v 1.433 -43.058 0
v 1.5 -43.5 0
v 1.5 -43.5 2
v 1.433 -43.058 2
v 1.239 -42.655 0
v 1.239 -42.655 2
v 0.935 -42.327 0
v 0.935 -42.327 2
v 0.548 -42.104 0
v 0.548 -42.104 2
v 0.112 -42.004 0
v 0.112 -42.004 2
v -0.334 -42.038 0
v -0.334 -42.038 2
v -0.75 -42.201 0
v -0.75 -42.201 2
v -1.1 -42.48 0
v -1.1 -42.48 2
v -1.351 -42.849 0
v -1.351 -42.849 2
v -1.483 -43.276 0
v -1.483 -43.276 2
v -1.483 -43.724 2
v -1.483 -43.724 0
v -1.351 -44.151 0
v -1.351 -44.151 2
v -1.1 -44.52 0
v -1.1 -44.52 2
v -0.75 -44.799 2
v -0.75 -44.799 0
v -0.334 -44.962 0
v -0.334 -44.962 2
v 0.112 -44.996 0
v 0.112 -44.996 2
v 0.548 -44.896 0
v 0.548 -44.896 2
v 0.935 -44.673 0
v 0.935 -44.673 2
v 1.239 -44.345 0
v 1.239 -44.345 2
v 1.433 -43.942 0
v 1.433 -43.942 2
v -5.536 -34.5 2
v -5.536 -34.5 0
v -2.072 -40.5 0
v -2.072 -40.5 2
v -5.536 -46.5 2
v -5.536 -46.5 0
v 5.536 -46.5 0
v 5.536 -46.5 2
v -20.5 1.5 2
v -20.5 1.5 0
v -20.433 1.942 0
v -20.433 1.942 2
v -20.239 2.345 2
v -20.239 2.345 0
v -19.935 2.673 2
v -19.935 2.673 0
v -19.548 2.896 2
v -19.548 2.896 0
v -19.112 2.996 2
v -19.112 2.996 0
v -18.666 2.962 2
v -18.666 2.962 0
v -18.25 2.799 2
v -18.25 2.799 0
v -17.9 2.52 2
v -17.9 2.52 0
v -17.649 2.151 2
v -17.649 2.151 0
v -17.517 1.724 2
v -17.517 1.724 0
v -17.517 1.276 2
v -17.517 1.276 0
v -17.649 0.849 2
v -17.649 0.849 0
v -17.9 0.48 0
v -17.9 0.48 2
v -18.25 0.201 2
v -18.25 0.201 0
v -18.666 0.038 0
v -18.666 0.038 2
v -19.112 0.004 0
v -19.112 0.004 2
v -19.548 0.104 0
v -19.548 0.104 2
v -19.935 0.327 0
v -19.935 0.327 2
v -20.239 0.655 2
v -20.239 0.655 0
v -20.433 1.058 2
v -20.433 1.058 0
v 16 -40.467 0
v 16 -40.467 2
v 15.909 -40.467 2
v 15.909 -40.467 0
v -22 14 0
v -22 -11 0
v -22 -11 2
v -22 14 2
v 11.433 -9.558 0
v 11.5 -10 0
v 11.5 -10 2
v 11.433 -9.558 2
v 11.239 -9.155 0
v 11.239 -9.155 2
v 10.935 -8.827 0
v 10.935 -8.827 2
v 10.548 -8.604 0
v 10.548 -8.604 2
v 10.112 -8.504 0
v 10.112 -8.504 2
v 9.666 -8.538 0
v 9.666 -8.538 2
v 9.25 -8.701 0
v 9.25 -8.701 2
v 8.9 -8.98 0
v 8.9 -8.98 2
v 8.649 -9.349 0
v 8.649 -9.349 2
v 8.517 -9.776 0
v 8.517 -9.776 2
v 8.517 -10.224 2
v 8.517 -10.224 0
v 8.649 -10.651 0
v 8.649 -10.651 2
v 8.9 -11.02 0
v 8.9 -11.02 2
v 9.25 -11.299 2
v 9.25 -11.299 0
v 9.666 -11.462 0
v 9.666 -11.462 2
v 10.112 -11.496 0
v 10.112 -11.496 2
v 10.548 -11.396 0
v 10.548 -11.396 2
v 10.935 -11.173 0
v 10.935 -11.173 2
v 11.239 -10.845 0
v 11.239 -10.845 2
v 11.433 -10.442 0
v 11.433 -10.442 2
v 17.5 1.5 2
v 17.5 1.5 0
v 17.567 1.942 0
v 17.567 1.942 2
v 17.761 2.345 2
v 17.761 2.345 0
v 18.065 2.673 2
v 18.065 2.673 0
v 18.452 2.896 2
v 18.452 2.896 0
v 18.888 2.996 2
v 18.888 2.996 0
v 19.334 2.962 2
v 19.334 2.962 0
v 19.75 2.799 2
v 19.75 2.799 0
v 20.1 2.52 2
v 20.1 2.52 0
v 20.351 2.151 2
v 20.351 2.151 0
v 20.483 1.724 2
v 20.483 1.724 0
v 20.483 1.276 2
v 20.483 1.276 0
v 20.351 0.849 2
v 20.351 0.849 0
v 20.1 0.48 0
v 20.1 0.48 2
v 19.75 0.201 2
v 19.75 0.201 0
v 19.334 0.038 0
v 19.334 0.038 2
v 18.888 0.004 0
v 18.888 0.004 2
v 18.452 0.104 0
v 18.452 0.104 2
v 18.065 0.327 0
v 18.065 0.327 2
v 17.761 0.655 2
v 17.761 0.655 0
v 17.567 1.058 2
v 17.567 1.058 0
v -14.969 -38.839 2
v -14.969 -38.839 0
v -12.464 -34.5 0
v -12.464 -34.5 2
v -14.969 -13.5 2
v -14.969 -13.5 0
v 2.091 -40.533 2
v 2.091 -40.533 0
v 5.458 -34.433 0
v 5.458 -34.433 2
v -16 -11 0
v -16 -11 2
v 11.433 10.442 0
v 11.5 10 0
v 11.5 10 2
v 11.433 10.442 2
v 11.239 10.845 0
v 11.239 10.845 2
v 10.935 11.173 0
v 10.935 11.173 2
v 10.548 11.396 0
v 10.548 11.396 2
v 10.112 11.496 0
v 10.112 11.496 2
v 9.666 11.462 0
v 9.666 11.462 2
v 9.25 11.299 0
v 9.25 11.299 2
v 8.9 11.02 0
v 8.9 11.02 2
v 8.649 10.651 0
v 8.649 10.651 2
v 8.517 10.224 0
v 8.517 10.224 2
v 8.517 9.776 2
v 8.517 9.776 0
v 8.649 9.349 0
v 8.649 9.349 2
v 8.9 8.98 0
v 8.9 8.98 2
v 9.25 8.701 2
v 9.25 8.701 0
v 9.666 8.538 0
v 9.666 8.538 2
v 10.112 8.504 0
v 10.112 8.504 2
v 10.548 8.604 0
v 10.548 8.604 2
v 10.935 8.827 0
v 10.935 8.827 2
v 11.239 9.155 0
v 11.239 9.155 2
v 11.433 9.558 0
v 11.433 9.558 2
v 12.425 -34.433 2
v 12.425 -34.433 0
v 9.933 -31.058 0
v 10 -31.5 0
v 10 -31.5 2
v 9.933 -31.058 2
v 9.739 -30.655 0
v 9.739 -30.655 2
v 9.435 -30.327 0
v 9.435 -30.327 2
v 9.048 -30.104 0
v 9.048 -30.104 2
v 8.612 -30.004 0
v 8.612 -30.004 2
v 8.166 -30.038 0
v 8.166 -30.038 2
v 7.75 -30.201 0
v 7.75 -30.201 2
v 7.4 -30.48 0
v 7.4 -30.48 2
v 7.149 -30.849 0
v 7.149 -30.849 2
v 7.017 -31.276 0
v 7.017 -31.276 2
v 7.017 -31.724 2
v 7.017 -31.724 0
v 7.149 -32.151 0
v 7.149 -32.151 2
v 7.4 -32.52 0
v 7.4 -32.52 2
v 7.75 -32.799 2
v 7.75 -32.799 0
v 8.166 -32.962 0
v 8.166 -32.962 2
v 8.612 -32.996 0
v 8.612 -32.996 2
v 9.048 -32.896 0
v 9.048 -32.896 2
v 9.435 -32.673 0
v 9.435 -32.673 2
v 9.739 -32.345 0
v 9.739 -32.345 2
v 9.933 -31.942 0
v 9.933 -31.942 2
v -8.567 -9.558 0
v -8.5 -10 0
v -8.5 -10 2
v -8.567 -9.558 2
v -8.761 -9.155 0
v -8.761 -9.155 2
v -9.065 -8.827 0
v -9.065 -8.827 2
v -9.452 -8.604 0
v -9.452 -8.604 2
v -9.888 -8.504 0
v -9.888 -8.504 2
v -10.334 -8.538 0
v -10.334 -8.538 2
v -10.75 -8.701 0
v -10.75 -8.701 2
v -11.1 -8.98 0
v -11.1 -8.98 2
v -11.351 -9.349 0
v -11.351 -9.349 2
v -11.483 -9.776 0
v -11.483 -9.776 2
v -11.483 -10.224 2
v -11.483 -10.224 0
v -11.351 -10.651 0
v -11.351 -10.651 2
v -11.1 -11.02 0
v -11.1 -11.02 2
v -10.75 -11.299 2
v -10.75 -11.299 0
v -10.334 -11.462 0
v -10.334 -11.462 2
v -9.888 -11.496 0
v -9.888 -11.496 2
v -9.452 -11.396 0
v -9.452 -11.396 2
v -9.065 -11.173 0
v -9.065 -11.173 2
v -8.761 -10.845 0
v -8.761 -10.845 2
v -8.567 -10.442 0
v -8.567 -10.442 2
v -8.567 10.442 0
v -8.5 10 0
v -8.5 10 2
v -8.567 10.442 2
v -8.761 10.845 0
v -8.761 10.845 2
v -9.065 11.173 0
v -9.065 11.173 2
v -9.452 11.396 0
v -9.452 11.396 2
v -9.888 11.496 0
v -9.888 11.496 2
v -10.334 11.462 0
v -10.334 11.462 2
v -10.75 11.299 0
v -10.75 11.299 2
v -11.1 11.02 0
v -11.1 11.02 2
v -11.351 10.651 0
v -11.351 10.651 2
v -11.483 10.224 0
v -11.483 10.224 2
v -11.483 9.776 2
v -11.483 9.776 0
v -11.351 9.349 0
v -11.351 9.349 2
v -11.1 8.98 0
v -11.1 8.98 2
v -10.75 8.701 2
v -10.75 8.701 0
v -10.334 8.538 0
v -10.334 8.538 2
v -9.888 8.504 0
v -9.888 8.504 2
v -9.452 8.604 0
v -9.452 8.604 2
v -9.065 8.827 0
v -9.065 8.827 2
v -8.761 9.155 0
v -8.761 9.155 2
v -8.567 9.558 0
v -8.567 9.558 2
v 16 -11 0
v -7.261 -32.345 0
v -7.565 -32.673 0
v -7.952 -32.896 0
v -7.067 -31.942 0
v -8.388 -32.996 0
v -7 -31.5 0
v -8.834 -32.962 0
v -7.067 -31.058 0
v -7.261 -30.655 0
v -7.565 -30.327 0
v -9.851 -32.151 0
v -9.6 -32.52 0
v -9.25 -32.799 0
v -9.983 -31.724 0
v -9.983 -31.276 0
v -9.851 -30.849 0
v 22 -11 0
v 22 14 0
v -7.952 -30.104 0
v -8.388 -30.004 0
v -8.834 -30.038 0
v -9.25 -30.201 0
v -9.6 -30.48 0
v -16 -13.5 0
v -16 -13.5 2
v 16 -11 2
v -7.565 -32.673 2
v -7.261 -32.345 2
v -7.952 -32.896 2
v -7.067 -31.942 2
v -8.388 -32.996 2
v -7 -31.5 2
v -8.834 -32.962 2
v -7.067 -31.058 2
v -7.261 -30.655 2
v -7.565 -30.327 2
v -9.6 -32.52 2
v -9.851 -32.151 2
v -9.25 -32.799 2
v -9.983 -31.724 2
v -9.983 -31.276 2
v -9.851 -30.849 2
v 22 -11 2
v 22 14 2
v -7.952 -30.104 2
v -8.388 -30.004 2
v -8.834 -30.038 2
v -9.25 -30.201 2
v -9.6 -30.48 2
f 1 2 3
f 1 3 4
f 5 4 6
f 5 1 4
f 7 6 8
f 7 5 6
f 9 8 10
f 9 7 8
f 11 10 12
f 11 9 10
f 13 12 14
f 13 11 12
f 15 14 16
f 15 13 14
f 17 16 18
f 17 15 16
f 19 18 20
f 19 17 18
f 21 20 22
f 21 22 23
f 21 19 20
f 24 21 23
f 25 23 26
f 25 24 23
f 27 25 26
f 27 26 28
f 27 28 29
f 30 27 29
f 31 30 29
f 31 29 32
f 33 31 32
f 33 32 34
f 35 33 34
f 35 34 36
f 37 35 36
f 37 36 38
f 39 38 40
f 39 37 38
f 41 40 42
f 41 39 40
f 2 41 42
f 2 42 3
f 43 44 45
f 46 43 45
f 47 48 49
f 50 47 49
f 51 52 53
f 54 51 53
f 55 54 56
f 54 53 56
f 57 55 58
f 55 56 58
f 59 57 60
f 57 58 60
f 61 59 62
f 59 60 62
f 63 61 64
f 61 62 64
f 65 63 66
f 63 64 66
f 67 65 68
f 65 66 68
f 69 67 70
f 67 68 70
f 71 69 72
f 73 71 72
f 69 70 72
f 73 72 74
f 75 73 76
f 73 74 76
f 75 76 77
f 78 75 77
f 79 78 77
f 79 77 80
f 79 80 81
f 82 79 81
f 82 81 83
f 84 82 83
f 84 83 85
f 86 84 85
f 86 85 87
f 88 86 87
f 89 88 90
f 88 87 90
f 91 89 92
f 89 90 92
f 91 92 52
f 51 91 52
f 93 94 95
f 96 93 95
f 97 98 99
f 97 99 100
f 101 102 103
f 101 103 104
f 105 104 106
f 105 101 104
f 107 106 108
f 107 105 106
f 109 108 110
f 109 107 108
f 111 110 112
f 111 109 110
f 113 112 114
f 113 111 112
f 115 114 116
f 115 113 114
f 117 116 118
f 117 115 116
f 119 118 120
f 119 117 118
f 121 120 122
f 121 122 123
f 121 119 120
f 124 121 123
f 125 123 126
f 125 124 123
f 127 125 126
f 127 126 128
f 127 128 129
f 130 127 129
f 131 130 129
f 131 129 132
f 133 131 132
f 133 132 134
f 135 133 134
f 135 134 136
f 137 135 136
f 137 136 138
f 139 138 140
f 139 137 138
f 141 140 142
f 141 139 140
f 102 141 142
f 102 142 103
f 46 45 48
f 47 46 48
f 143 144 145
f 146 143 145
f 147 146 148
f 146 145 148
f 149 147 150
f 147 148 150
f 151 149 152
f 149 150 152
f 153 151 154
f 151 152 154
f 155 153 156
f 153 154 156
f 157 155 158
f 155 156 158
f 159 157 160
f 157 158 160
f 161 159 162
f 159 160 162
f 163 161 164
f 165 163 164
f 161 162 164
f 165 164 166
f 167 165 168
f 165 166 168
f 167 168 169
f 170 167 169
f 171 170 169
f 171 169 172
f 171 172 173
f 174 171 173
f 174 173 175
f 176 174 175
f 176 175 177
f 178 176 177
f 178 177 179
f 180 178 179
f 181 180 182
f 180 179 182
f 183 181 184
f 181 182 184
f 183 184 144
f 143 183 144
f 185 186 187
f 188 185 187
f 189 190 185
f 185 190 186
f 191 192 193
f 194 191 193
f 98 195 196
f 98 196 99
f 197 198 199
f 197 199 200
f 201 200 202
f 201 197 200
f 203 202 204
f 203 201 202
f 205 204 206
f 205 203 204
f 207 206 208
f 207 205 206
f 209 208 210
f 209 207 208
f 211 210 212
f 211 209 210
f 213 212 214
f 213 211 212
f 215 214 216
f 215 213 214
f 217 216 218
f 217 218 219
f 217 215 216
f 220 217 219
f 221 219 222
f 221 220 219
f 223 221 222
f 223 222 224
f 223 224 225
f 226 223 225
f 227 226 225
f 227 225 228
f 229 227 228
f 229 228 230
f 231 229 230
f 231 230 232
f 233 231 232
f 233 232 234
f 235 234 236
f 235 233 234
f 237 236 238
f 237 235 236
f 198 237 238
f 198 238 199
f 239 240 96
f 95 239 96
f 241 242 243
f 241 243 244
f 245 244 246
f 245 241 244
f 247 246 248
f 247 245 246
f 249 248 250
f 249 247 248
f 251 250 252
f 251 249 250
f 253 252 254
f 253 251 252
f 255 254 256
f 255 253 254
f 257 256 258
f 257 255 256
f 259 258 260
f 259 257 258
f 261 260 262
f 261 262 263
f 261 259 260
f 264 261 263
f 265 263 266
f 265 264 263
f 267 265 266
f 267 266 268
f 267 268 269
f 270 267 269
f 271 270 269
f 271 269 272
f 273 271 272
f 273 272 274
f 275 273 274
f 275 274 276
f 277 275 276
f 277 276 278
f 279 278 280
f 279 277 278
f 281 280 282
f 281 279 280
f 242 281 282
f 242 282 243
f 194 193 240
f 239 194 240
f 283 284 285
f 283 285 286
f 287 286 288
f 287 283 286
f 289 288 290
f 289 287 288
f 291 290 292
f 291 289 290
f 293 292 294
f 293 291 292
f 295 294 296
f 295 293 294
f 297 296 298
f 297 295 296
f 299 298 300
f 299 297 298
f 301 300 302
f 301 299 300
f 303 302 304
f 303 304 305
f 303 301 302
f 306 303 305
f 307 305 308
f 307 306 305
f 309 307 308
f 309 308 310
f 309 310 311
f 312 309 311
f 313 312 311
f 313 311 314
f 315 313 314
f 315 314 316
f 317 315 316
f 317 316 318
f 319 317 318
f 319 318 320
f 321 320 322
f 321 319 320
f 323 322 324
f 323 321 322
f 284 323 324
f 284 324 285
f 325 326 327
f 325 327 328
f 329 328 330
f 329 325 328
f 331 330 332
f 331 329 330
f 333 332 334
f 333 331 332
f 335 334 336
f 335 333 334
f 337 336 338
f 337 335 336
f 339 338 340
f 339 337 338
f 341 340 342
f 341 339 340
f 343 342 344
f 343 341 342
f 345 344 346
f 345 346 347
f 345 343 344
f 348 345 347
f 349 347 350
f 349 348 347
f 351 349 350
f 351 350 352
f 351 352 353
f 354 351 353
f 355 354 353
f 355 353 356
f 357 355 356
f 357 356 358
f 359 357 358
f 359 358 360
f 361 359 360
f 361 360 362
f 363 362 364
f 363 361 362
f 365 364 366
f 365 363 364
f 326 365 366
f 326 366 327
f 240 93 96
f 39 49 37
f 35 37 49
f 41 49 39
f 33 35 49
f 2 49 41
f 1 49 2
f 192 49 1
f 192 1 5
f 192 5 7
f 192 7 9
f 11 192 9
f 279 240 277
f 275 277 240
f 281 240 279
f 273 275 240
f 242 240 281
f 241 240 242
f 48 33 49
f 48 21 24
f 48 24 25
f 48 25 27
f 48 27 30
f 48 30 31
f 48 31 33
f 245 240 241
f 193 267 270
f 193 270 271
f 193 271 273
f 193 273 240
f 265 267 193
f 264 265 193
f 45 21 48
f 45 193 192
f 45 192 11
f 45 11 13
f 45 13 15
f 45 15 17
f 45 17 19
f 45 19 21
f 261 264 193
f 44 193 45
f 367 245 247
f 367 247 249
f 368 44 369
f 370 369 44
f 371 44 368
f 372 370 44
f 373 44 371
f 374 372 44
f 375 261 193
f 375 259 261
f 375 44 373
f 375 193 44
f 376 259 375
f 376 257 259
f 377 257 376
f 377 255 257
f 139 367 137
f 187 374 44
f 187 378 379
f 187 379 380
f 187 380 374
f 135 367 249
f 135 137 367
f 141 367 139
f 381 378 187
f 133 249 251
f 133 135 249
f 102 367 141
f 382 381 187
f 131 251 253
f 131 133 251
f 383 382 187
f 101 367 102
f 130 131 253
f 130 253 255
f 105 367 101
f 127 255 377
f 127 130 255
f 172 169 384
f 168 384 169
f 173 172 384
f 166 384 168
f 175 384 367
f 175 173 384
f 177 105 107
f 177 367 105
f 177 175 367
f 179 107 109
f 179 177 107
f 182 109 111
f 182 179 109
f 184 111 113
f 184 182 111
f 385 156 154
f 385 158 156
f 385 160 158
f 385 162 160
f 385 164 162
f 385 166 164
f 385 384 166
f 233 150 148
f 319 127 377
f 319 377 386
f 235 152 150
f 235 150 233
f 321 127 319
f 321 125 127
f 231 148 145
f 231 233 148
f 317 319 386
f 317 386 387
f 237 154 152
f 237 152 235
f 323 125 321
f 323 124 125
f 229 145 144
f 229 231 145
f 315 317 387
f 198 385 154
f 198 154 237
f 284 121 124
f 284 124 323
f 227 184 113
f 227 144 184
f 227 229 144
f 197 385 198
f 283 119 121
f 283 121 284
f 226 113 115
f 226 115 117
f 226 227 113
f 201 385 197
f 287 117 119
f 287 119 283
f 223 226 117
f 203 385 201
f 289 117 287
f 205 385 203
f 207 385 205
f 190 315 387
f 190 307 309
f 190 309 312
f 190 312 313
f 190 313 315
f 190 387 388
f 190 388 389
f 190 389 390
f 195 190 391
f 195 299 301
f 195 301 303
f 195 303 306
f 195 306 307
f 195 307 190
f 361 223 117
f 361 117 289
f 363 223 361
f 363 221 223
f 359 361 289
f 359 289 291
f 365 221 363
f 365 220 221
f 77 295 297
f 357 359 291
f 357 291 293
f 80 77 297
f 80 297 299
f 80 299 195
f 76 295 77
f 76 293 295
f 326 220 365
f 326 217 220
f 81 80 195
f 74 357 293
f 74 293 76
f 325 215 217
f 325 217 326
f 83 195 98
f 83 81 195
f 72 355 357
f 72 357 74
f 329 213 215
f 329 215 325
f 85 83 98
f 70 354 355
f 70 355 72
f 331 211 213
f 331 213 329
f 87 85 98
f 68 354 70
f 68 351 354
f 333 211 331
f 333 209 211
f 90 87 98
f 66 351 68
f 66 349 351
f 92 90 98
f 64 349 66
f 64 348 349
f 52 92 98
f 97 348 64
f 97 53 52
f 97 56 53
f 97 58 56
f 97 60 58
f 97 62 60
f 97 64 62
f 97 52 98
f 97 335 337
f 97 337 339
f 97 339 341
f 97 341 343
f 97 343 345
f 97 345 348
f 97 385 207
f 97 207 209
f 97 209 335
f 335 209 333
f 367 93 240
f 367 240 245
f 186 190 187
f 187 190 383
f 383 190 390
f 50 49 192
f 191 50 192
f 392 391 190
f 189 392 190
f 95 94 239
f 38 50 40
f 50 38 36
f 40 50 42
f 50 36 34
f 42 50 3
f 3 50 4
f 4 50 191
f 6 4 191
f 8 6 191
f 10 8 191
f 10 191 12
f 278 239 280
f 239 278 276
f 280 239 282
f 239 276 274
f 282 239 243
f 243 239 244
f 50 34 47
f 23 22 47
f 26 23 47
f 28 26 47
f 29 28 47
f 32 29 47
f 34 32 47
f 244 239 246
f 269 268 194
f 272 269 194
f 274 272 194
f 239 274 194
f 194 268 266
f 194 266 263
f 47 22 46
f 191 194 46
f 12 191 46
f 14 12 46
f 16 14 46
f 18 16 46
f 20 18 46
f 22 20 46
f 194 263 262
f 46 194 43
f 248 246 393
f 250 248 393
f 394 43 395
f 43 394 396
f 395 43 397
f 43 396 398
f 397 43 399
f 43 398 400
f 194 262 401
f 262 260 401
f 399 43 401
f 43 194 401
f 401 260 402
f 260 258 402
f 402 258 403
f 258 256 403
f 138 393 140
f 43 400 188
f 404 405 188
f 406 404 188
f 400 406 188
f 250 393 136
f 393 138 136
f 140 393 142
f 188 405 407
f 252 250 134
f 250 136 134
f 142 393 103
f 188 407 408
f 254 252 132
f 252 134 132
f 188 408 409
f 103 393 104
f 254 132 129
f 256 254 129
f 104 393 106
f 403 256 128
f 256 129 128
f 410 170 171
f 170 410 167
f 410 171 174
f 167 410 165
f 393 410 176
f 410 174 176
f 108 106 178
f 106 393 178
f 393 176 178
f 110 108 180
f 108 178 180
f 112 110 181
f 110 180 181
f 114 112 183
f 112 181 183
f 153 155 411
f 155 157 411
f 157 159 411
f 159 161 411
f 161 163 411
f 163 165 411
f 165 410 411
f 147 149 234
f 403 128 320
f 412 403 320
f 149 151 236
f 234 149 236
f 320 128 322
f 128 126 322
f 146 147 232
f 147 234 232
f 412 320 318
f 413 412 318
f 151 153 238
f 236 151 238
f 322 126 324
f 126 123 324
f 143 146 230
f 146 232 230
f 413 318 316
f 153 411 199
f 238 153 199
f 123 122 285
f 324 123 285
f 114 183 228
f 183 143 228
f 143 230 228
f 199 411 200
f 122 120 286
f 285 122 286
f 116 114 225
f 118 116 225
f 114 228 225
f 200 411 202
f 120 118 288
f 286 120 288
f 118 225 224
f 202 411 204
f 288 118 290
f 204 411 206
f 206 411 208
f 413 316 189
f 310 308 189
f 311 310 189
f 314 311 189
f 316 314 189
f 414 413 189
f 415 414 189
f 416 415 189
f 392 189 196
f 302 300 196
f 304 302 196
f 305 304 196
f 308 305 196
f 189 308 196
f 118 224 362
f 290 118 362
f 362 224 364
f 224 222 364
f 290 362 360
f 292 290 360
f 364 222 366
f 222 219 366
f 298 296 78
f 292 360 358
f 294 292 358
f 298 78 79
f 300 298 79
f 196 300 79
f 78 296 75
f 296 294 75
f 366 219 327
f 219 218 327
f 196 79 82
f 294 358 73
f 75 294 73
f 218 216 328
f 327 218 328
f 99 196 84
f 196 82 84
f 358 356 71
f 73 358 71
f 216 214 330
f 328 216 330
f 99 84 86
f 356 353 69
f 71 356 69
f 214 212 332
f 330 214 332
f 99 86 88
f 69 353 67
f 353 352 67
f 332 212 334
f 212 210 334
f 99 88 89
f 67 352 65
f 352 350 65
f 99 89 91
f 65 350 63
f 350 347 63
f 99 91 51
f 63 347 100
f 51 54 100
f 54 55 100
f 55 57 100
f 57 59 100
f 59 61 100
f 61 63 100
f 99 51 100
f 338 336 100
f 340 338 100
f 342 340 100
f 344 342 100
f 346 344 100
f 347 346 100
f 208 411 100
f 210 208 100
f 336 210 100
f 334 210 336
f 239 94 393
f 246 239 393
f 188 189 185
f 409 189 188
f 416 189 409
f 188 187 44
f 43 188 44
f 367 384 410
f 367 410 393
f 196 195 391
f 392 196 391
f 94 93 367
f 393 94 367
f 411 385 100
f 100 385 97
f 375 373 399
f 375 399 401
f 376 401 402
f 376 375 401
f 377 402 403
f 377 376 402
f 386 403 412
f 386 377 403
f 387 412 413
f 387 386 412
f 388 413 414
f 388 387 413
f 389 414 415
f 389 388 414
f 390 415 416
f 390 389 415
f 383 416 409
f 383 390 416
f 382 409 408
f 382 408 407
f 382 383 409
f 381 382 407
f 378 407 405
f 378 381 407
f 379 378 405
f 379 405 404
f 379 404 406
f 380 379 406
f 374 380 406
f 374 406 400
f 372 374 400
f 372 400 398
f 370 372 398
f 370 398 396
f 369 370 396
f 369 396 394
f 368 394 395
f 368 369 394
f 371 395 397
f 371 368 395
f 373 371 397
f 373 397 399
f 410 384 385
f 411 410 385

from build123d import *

# Parameters (mm, degrees)
SKETCH1_R           = 1.500000001
SKETCH1_R_2         = 1.5
BOSS_EXTRUDE2_DEPTH = 2
SKETCH10_W          = 6
SKETCH10_H          = 25
SKETCH10_R          = 1.5
BOSS_EXTRUDE8_DEPTH = 2
CUT_EXTRUDE1_DEPTH  = 10


with BuildPart() as part:
    # Sketch1 → Boss-Extrude2 (new body)
    with BuildSketch(Plane.XY):
        Polygon((16, 14), (-16, 14), (-16, -13.5), (-14.969293645, -13.5), (-14.969293645, -38.839119879), (-12.464101615, -34.5), (-5.535898385, -34.5), (-2.07179677, -40.5), (-5.535898385, -46.5), (5.535898385, -46.5), (2.090853862, -40.533007852), (5.457729166, -34.432863746), (12.425340481, -34.432863746), (15.909146138, -40.466992148), (15, -42.114193768), (15, -46.5), (16, -46.5), align=None)
        with Locations((-10, -10)):
            Circle(SKETCH1_R, mode=Mode.SUBTRACT)
        with Locations((10, -10)):
            Circle(SKETCH1_R, mode=Mode.SUBTRACT)
        with Locations((-10, 10)):
            Circle(SKETCH1_R, mode=Mode.SUBTRACT)
        with Locations((10, 10)):
            Circle(SKETCH1_R, mode=Mode.SUBTRACT)
        with Locations((8.5, -31.5)):
            Circle(SKETCH1_R_2, mode=Mode.SUBTRACT)
        with Locations((0, -43.5)):
            Circle(SKETCH1_R_2, mode=Mode.SUBTRACT)
        with Locations((-8.5, -31.5)):
            Circle(SKETCH1_R_2, mode=Mode.SUBTRACT)
    extrude(amount=BOSS_EXTRUDE2_DEPTH)

    # Sketch10 → Boss-Extrude8 (add)
    with BuildSketch(Plane(origin=(0, 0, 0), x_dir=(-1, 0, 0), z_dir=(0, 0, -1))):
        with Locations((19, 1.5)):
            Rectangle(SKETCH10_W, SKETCH10_H)
        with Locations((19, 1.5)):
            Circle(SKETCH10_R, mode=Mode.SUBTRACT)
        with Locations((-19, 1.5)):
            Rectangle(SKETCH10_W, SKETCH10_H)
        with Locations((-19, 1.5)):
            Circle(SKETCH10_R, mode=Mode.SUBTRACT)
    extrude(amount=-BOSS_EXTRUDE8_DEPTH)

    # Sketch5 → Cut-Extrude1 (cut)
    with BuildSketch(Plane.XY.offset(2)):
        Polygon((15, -42.114193768), (15.909146138, -40.466992148), (10.36687247, -40.472738184), (10.36687247, -46.5), (15, -46.5), align=None)
        Polygon((16, -40.466897954), (15.909146138, -40.466992148), (15, -42.114193768), (15, -46.5), (16, -46.5), align=None)
        Polygon((17.825288522, -40.465005559), (16, -40.466897954), (16, -46.5), (17.916172301, -46.5), align=None)
    extrude(amount=-CUT_EXTRUDE1_DEPTH, mode=Mode.SUBTRACT)


solid = part.part
